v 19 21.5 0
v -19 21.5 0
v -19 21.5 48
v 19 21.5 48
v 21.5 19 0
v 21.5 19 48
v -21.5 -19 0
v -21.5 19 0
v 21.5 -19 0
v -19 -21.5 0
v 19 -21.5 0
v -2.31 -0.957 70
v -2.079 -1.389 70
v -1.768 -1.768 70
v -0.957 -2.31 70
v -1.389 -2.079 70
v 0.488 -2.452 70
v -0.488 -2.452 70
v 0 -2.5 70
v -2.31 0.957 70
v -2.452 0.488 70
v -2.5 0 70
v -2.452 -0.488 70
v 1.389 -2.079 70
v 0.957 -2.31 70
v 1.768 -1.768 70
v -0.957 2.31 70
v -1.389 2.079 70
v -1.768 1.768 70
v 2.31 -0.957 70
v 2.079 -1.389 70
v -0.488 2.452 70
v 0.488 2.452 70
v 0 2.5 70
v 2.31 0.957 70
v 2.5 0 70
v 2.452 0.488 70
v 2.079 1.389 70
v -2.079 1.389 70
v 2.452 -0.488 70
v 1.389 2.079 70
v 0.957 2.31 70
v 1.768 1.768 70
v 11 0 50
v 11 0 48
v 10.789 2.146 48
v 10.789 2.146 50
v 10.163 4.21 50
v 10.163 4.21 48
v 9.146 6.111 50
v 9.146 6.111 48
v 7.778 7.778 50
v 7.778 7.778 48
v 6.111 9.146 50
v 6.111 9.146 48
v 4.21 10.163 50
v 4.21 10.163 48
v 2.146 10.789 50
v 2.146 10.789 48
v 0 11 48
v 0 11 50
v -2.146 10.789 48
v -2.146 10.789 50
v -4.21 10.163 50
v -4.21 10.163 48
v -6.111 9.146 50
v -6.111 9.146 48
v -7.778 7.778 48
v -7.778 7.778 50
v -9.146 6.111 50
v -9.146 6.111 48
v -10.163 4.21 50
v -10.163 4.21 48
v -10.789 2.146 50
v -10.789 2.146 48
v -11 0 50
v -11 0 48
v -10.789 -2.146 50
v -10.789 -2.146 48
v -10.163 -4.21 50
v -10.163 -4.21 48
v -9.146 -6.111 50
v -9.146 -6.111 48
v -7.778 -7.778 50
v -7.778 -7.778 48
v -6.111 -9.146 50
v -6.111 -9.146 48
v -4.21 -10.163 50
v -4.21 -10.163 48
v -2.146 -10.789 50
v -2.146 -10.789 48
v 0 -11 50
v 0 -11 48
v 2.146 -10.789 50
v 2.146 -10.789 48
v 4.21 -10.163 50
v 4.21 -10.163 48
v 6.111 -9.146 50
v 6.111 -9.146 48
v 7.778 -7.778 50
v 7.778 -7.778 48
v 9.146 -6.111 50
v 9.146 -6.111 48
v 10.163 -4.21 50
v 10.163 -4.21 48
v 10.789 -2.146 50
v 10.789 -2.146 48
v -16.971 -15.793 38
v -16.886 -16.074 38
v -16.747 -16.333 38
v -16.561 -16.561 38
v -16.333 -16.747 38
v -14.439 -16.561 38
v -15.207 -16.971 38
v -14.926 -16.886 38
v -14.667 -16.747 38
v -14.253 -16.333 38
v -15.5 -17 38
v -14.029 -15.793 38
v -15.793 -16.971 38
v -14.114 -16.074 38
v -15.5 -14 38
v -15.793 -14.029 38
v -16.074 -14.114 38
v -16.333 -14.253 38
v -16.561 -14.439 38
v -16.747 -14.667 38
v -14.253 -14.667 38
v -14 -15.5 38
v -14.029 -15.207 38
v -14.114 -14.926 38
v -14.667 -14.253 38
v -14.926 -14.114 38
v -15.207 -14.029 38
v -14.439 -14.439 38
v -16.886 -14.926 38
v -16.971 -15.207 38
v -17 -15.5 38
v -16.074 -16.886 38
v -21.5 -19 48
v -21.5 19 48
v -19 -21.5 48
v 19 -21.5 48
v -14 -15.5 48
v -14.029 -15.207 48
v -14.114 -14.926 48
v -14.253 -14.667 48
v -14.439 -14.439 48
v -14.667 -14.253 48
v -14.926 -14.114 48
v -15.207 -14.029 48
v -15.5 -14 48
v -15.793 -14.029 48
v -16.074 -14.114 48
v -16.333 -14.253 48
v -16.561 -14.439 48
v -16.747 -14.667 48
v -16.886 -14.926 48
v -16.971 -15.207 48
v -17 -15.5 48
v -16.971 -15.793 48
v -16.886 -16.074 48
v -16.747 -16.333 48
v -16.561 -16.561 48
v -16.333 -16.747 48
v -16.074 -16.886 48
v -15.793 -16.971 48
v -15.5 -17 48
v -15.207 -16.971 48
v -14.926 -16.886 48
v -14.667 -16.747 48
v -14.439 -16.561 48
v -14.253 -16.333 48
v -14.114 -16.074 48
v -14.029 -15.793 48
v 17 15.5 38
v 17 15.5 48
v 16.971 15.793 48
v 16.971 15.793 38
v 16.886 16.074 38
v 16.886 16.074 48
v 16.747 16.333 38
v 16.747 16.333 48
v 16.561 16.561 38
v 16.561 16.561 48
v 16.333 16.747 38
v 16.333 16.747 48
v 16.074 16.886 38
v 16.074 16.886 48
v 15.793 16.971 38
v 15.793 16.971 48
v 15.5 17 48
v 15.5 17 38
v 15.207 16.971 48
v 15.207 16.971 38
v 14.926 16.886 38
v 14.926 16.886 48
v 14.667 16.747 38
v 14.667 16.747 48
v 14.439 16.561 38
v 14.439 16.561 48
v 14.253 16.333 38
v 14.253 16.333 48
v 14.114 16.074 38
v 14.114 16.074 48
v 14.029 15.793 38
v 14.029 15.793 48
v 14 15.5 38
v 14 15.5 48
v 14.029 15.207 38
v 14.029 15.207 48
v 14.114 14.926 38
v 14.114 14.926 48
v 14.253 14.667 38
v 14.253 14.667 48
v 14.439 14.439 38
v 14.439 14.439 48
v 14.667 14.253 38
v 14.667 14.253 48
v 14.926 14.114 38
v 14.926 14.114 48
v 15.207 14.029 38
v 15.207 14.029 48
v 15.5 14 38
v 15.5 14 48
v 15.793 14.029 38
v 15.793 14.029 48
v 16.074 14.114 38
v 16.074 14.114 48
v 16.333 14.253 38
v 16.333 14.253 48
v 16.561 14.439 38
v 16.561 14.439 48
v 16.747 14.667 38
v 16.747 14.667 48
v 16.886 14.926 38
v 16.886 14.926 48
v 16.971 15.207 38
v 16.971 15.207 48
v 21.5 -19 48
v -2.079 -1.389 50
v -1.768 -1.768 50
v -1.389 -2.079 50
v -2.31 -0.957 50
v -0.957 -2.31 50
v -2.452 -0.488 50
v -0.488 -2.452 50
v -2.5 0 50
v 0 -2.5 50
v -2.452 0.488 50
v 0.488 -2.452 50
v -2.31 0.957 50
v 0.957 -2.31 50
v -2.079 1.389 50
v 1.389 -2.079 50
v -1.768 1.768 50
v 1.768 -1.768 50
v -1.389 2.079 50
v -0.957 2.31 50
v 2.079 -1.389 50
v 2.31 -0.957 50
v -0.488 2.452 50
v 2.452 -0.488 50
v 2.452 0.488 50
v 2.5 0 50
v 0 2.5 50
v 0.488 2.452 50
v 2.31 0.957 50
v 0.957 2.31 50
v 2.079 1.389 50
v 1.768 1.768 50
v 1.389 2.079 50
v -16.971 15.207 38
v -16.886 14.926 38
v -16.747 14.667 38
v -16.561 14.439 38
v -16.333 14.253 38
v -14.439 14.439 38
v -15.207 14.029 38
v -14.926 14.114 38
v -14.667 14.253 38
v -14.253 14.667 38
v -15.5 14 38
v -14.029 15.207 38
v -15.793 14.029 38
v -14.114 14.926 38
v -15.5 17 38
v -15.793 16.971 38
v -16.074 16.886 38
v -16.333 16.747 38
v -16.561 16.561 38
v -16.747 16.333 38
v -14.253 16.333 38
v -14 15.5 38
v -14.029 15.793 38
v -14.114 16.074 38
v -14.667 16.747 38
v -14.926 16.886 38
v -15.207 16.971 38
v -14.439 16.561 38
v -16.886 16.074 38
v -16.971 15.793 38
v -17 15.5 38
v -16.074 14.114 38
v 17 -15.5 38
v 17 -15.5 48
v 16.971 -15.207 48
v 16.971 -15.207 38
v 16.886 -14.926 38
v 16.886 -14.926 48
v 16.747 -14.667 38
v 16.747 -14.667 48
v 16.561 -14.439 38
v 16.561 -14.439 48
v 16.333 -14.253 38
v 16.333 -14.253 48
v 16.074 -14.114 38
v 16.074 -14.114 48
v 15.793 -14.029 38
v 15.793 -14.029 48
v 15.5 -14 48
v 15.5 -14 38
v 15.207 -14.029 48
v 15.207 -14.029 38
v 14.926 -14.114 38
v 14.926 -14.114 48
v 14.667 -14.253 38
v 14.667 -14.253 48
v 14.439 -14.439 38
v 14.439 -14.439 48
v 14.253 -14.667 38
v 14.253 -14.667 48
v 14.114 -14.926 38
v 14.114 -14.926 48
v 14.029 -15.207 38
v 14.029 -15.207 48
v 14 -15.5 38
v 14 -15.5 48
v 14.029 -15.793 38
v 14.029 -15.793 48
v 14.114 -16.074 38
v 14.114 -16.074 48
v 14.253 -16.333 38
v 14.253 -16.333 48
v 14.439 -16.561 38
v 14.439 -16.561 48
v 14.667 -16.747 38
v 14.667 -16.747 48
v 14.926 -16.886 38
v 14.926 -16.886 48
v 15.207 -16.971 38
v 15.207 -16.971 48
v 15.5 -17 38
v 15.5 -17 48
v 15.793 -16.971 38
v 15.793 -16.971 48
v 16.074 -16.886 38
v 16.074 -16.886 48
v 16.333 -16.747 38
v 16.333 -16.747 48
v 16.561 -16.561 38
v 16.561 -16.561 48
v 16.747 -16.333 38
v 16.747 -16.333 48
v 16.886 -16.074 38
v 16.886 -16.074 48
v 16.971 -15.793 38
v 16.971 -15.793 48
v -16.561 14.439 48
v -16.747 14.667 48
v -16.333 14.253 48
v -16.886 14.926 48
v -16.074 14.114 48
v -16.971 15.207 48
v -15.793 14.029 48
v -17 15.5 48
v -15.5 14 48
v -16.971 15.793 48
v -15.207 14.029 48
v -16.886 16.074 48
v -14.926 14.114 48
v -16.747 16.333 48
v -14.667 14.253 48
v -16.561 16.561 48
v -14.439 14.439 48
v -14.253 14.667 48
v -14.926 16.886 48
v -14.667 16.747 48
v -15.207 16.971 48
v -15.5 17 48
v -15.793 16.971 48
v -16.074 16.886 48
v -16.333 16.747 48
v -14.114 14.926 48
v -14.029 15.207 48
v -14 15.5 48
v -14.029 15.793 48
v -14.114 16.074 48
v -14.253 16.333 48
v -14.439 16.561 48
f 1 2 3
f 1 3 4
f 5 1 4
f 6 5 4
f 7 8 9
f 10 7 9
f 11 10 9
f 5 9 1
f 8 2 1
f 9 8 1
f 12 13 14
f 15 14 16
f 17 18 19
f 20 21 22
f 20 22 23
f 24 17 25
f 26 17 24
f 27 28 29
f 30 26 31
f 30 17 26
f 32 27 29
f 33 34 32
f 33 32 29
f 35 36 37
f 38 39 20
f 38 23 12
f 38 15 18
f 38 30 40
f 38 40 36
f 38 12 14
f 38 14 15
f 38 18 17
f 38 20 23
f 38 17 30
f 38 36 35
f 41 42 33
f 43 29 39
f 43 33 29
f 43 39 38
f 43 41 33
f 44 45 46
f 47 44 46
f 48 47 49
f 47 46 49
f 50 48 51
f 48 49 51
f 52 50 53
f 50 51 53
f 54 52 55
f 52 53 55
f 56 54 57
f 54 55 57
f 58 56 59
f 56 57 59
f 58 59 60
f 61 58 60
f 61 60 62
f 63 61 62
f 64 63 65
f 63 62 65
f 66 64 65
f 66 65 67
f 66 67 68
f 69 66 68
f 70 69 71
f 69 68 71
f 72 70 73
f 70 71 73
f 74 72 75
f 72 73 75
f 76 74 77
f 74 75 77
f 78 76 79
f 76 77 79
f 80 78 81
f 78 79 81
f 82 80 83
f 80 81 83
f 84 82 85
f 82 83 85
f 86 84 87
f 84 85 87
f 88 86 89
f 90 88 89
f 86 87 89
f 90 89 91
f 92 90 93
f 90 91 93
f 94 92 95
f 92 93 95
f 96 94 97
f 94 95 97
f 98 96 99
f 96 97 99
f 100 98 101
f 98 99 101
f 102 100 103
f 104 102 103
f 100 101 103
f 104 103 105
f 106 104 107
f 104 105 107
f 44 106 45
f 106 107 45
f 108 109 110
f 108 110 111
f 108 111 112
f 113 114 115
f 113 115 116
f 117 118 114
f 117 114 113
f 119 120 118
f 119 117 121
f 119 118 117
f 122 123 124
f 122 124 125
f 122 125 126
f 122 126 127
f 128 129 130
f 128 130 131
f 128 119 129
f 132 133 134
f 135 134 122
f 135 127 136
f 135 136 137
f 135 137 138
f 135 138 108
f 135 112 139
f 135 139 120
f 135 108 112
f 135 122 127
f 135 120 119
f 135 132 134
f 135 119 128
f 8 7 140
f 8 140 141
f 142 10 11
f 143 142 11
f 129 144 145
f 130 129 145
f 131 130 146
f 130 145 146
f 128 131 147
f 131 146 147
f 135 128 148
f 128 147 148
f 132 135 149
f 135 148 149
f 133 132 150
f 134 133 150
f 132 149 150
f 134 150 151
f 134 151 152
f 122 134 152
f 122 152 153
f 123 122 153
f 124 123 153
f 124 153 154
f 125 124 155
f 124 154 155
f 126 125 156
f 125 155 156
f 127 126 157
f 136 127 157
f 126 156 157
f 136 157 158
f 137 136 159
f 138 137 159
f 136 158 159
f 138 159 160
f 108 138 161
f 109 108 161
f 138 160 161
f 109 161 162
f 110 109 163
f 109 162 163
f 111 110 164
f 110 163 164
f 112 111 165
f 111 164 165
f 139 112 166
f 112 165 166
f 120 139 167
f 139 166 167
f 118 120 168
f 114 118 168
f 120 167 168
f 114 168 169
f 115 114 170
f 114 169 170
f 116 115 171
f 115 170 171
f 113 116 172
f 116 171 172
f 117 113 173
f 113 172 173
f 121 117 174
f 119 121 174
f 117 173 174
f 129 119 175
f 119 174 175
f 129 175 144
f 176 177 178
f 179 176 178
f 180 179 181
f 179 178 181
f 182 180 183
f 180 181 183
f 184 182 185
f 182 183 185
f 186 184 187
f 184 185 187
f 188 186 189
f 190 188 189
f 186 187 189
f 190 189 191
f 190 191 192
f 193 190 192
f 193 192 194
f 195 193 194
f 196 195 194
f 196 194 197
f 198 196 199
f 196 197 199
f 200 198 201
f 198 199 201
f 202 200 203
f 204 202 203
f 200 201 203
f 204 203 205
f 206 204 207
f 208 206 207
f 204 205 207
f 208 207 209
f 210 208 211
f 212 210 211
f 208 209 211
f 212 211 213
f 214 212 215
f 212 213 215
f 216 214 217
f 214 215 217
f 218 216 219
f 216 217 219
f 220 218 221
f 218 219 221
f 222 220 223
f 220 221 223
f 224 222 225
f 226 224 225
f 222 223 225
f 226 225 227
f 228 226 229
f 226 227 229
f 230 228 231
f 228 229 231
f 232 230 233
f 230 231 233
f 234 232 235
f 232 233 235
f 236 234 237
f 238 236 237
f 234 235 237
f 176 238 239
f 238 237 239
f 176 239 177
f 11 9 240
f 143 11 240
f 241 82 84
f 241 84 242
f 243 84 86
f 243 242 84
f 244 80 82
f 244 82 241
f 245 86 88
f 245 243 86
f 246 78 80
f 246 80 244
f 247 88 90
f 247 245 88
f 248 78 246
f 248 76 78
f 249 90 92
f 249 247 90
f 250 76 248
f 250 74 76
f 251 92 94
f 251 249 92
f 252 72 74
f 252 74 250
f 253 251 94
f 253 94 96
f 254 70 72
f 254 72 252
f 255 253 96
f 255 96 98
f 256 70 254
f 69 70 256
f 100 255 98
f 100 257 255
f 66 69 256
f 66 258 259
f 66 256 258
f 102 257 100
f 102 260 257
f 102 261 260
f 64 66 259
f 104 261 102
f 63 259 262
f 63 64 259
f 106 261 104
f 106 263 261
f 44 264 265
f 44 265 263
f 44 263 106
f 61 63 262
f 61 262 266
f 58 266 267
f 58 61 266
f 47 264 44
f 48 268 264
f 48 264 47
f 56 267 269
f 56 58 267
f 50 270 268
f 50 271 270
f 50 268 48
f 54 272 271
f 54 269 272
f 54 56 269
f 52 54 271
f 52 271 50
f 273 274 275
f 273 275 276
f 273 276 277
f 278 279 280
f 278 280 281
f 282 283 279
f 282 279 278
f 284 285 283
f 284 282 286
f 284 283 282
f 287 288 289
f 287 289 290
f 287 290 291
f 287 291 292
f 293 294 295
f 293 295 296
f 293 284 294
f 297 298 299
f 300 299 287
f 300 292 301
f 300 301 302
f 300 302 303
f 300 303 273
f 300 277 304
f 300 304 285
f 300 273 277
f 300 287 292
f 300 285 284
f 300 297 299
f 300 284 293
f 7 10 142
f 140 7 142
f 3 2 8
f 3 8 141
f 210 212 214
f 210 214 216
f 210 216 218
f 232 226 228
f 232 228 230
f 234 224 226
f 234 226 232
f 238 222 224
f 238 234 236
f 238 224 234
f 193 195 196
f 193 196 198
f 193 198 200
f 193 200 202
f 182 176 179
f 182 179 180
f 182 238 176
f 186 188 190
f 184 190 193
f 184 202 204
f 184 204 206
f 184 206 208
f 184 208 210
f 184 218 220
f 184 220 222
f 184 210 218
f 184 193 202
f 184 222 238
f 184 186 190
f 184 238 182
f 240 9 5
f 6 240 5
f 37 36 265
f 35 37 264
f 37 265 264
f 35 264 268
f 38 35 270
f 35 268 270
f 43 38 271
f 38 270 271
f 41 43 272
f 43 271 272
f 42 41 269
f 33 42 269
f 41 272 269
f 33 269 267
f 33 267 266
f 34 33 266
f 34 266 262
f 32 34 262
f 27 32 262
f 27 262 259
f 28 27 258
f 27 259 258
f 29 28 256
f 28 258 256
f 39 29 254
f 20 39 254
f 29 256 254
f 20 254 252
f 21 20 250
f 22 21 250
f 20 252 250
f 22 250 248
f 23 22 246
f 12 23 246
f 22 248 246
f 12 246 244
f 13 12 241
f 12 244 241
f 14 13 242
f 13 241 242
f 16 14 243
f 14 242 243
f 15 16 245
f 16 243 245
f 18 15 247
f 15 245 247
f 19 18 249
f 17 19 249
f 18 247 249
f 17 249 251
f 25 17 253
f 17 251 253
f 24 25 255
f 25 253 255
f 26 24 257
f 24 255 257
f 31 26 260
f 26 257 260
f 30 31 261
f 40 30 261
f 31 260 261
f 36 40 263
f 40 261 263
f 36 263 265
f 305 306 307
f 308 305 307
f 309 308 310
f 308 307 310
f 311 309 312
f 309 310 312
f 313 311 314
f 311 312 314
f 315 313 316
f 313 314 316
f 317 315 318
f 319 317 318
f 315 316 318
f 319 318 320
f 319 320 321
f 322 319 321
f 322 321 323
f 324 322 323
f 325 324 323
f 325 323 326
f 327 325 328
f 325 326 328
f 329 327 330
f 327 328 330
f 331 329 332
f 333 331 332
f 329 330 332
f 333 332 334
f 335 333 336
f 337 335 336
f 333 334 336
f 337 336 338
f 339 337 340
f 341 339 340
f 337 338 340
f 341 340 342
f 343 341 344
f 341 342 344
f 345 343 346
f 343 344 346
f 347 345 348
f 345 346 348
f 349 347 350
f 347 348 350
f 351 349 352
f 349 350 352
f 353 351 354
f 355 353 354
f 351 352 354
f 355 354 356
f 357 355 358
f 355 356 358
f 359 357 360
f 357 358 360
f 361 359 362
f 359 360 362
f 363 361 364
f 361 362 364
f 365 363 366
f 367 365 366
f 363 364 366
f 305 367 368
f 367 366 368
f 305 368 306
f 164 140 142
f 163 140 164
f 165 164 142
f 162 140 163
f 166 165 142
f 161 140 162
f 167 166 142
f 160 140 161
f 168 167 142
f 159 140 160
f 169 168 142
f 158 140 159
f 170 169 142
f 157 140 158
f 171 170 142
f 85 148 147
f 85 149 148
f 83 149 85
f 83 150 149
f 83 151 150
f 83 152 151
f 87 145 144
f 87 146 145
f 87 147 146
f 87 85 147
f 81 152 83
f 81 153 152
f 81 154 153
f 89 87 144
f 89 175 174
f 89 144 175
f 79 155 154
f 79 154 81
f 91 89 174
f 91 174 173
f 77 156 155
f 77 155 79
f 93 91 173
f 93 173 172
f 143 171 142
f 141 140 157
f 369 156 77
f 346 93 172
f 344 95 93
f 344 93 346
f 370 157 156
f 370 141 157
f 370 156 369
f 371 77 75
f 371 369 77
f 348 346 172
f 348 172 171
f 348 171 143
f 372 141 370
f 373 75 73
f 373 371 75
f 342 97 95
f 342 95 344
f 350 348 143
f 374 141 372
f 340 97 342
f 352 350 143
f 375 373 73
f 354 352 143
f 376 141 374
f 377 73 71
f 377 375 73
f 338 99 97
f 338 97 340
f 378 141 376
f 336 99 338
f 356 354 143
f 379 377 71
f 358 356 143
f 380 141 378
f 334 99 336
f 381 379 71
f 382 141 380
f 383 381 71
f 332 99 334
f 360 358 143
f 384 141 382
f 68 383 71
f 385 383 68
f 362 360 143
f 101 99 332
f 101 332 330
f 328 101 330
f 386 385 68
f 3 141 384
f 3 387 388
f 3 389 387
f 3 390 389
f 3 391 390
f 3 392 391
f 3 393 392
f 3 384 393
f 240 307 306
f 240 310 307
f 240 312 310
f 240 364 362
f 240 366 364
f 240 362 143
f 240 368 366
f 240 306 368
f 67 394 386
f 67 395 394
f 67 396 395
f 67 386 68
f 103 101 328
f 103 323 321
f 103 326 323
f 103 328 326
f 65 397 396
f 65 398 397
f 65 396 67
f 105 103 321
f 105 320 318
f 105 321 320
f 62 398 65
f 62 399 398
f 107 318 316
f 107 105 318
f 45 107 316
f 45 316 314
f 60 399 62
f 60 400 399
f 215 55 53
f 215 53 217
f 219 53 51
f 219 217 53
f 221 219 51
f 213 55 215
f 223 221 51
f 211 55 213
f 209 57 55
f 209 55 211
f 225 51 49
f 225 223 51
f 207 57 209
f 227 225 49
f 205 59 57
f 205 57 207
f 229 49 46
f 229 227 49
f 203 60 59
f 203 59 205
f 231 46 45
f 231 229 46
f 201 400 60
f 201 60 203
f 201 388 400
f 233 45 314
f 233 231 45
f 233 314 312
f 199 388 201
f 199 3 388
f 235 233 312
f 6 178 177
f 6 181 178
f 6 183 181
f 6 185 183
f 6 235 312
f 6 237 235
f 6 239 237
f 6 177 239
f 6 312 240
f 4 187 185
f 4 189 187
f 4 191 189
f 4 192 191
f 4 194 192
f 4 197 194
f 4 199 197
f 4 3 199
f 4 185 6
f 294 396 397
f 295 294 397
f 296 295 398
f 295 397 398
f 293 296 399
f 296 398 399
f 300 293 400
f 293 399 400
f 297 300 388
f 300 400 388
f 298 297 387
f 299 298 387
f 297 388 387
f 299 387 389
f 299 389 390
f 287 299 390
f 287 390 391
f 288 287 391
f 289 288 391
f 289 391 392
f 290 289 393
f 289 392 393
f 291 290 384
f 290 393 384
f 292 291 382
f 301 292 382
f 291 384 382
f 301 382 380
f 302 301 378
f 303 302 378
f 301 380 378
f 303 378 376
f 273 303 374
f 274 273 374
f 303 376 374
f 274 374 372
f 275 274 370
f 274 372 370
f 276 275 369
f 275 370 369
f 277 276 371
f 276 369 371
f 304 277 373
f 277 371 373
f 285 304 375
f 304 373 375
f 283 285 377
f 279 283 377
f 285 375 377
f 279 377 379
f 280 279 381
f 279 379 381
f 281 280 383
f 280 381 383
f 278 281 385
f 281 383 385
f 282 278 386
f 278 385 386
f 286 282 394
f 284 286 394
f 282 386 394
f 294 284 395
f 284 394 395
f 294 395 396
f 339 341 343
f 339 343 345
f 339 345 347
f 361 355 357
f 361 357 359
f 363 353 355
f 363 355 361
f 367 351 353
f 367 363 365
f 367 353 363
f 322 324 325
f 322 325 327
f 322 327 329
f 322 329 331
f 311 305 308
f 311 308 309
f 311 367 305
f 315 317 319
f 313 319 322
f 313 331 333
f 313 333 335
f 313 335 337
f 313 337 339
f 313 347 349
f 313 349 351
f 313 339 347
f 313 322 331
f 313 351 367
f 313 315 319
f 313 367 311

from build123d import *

# Parameters (mm, degrees)
SKETCH1_W           = 43
SKETCH1_H           = 43
BOSS_EXTRUDE1_DEPTH = 48
CHAMFER1_SIZE       = 2.5
SKETCH2_R           = 11
BOSS_EXTRUDE2_DEPTH = 2
SKETCH3_R           = 2.5
BOSS_EXTRUDE3_DEPTH = 20
SKETCH4_R           = 1.5
CUT_EXTRUDE1_DEPTH  = 10


with BuildPart() as part:
    # Sketch1 → Boss-Extrude1 (new body)
    with BuildSketch(Plane.XY):
        Rectangle(SKETCH1_W, SKETCH1_H)
    extrude(amount=BOSS_EXTRUDE1_DEPTH)

    # Chamfer1
    chamfer1_edges = [part.edges().sort_by_distance(p)[0] for p in [
        (21.5, -21.5, 24),
        (-21.5, -21.5, 24),
        (-21.5, 21.5, 24),
        (21.5, 21.5, 24),
    ]]
    chamfer(chamfer1_edges, length=CHAMFER1_SIZE)

    # Sketch2 → Boss-Extrude2 (add)
    with BuildSketch(Plane.XY.offset(48)):
        Circle(SKETCH2_R)
    extrude(amount=BOSS_EXTRUDE2_DEPTH)

    # Sketch3 → Boss-Extrude3 (add)
    with BuildSketch(Plane.XY.offset(50)):
        Circle(SKETCH3_R)
    extrude(amount=BOSS_EXTRUDE3_DEPTH)

    # Sketch4 → Cut-Extrude1 (cut)
    with BuildSketch(Plane.XY.offset(48)):
        with Locations((-15.5, 15.5)):
            Circle(SKETCH4_R)
        with Locations((15.5, 15.5)):
            Circle(SKETCH4_R)
        with Locations((15.5, -15.5)):
            Circle(SKETCH4_R)
        with Locations((-15.5, -15.5)):
            Circle(SKETCH4_R)
    extrude(amount=-CUT_EXTRUDE1_DEPTH, mode=Mode.SUBTRACT)


solid = part.part
